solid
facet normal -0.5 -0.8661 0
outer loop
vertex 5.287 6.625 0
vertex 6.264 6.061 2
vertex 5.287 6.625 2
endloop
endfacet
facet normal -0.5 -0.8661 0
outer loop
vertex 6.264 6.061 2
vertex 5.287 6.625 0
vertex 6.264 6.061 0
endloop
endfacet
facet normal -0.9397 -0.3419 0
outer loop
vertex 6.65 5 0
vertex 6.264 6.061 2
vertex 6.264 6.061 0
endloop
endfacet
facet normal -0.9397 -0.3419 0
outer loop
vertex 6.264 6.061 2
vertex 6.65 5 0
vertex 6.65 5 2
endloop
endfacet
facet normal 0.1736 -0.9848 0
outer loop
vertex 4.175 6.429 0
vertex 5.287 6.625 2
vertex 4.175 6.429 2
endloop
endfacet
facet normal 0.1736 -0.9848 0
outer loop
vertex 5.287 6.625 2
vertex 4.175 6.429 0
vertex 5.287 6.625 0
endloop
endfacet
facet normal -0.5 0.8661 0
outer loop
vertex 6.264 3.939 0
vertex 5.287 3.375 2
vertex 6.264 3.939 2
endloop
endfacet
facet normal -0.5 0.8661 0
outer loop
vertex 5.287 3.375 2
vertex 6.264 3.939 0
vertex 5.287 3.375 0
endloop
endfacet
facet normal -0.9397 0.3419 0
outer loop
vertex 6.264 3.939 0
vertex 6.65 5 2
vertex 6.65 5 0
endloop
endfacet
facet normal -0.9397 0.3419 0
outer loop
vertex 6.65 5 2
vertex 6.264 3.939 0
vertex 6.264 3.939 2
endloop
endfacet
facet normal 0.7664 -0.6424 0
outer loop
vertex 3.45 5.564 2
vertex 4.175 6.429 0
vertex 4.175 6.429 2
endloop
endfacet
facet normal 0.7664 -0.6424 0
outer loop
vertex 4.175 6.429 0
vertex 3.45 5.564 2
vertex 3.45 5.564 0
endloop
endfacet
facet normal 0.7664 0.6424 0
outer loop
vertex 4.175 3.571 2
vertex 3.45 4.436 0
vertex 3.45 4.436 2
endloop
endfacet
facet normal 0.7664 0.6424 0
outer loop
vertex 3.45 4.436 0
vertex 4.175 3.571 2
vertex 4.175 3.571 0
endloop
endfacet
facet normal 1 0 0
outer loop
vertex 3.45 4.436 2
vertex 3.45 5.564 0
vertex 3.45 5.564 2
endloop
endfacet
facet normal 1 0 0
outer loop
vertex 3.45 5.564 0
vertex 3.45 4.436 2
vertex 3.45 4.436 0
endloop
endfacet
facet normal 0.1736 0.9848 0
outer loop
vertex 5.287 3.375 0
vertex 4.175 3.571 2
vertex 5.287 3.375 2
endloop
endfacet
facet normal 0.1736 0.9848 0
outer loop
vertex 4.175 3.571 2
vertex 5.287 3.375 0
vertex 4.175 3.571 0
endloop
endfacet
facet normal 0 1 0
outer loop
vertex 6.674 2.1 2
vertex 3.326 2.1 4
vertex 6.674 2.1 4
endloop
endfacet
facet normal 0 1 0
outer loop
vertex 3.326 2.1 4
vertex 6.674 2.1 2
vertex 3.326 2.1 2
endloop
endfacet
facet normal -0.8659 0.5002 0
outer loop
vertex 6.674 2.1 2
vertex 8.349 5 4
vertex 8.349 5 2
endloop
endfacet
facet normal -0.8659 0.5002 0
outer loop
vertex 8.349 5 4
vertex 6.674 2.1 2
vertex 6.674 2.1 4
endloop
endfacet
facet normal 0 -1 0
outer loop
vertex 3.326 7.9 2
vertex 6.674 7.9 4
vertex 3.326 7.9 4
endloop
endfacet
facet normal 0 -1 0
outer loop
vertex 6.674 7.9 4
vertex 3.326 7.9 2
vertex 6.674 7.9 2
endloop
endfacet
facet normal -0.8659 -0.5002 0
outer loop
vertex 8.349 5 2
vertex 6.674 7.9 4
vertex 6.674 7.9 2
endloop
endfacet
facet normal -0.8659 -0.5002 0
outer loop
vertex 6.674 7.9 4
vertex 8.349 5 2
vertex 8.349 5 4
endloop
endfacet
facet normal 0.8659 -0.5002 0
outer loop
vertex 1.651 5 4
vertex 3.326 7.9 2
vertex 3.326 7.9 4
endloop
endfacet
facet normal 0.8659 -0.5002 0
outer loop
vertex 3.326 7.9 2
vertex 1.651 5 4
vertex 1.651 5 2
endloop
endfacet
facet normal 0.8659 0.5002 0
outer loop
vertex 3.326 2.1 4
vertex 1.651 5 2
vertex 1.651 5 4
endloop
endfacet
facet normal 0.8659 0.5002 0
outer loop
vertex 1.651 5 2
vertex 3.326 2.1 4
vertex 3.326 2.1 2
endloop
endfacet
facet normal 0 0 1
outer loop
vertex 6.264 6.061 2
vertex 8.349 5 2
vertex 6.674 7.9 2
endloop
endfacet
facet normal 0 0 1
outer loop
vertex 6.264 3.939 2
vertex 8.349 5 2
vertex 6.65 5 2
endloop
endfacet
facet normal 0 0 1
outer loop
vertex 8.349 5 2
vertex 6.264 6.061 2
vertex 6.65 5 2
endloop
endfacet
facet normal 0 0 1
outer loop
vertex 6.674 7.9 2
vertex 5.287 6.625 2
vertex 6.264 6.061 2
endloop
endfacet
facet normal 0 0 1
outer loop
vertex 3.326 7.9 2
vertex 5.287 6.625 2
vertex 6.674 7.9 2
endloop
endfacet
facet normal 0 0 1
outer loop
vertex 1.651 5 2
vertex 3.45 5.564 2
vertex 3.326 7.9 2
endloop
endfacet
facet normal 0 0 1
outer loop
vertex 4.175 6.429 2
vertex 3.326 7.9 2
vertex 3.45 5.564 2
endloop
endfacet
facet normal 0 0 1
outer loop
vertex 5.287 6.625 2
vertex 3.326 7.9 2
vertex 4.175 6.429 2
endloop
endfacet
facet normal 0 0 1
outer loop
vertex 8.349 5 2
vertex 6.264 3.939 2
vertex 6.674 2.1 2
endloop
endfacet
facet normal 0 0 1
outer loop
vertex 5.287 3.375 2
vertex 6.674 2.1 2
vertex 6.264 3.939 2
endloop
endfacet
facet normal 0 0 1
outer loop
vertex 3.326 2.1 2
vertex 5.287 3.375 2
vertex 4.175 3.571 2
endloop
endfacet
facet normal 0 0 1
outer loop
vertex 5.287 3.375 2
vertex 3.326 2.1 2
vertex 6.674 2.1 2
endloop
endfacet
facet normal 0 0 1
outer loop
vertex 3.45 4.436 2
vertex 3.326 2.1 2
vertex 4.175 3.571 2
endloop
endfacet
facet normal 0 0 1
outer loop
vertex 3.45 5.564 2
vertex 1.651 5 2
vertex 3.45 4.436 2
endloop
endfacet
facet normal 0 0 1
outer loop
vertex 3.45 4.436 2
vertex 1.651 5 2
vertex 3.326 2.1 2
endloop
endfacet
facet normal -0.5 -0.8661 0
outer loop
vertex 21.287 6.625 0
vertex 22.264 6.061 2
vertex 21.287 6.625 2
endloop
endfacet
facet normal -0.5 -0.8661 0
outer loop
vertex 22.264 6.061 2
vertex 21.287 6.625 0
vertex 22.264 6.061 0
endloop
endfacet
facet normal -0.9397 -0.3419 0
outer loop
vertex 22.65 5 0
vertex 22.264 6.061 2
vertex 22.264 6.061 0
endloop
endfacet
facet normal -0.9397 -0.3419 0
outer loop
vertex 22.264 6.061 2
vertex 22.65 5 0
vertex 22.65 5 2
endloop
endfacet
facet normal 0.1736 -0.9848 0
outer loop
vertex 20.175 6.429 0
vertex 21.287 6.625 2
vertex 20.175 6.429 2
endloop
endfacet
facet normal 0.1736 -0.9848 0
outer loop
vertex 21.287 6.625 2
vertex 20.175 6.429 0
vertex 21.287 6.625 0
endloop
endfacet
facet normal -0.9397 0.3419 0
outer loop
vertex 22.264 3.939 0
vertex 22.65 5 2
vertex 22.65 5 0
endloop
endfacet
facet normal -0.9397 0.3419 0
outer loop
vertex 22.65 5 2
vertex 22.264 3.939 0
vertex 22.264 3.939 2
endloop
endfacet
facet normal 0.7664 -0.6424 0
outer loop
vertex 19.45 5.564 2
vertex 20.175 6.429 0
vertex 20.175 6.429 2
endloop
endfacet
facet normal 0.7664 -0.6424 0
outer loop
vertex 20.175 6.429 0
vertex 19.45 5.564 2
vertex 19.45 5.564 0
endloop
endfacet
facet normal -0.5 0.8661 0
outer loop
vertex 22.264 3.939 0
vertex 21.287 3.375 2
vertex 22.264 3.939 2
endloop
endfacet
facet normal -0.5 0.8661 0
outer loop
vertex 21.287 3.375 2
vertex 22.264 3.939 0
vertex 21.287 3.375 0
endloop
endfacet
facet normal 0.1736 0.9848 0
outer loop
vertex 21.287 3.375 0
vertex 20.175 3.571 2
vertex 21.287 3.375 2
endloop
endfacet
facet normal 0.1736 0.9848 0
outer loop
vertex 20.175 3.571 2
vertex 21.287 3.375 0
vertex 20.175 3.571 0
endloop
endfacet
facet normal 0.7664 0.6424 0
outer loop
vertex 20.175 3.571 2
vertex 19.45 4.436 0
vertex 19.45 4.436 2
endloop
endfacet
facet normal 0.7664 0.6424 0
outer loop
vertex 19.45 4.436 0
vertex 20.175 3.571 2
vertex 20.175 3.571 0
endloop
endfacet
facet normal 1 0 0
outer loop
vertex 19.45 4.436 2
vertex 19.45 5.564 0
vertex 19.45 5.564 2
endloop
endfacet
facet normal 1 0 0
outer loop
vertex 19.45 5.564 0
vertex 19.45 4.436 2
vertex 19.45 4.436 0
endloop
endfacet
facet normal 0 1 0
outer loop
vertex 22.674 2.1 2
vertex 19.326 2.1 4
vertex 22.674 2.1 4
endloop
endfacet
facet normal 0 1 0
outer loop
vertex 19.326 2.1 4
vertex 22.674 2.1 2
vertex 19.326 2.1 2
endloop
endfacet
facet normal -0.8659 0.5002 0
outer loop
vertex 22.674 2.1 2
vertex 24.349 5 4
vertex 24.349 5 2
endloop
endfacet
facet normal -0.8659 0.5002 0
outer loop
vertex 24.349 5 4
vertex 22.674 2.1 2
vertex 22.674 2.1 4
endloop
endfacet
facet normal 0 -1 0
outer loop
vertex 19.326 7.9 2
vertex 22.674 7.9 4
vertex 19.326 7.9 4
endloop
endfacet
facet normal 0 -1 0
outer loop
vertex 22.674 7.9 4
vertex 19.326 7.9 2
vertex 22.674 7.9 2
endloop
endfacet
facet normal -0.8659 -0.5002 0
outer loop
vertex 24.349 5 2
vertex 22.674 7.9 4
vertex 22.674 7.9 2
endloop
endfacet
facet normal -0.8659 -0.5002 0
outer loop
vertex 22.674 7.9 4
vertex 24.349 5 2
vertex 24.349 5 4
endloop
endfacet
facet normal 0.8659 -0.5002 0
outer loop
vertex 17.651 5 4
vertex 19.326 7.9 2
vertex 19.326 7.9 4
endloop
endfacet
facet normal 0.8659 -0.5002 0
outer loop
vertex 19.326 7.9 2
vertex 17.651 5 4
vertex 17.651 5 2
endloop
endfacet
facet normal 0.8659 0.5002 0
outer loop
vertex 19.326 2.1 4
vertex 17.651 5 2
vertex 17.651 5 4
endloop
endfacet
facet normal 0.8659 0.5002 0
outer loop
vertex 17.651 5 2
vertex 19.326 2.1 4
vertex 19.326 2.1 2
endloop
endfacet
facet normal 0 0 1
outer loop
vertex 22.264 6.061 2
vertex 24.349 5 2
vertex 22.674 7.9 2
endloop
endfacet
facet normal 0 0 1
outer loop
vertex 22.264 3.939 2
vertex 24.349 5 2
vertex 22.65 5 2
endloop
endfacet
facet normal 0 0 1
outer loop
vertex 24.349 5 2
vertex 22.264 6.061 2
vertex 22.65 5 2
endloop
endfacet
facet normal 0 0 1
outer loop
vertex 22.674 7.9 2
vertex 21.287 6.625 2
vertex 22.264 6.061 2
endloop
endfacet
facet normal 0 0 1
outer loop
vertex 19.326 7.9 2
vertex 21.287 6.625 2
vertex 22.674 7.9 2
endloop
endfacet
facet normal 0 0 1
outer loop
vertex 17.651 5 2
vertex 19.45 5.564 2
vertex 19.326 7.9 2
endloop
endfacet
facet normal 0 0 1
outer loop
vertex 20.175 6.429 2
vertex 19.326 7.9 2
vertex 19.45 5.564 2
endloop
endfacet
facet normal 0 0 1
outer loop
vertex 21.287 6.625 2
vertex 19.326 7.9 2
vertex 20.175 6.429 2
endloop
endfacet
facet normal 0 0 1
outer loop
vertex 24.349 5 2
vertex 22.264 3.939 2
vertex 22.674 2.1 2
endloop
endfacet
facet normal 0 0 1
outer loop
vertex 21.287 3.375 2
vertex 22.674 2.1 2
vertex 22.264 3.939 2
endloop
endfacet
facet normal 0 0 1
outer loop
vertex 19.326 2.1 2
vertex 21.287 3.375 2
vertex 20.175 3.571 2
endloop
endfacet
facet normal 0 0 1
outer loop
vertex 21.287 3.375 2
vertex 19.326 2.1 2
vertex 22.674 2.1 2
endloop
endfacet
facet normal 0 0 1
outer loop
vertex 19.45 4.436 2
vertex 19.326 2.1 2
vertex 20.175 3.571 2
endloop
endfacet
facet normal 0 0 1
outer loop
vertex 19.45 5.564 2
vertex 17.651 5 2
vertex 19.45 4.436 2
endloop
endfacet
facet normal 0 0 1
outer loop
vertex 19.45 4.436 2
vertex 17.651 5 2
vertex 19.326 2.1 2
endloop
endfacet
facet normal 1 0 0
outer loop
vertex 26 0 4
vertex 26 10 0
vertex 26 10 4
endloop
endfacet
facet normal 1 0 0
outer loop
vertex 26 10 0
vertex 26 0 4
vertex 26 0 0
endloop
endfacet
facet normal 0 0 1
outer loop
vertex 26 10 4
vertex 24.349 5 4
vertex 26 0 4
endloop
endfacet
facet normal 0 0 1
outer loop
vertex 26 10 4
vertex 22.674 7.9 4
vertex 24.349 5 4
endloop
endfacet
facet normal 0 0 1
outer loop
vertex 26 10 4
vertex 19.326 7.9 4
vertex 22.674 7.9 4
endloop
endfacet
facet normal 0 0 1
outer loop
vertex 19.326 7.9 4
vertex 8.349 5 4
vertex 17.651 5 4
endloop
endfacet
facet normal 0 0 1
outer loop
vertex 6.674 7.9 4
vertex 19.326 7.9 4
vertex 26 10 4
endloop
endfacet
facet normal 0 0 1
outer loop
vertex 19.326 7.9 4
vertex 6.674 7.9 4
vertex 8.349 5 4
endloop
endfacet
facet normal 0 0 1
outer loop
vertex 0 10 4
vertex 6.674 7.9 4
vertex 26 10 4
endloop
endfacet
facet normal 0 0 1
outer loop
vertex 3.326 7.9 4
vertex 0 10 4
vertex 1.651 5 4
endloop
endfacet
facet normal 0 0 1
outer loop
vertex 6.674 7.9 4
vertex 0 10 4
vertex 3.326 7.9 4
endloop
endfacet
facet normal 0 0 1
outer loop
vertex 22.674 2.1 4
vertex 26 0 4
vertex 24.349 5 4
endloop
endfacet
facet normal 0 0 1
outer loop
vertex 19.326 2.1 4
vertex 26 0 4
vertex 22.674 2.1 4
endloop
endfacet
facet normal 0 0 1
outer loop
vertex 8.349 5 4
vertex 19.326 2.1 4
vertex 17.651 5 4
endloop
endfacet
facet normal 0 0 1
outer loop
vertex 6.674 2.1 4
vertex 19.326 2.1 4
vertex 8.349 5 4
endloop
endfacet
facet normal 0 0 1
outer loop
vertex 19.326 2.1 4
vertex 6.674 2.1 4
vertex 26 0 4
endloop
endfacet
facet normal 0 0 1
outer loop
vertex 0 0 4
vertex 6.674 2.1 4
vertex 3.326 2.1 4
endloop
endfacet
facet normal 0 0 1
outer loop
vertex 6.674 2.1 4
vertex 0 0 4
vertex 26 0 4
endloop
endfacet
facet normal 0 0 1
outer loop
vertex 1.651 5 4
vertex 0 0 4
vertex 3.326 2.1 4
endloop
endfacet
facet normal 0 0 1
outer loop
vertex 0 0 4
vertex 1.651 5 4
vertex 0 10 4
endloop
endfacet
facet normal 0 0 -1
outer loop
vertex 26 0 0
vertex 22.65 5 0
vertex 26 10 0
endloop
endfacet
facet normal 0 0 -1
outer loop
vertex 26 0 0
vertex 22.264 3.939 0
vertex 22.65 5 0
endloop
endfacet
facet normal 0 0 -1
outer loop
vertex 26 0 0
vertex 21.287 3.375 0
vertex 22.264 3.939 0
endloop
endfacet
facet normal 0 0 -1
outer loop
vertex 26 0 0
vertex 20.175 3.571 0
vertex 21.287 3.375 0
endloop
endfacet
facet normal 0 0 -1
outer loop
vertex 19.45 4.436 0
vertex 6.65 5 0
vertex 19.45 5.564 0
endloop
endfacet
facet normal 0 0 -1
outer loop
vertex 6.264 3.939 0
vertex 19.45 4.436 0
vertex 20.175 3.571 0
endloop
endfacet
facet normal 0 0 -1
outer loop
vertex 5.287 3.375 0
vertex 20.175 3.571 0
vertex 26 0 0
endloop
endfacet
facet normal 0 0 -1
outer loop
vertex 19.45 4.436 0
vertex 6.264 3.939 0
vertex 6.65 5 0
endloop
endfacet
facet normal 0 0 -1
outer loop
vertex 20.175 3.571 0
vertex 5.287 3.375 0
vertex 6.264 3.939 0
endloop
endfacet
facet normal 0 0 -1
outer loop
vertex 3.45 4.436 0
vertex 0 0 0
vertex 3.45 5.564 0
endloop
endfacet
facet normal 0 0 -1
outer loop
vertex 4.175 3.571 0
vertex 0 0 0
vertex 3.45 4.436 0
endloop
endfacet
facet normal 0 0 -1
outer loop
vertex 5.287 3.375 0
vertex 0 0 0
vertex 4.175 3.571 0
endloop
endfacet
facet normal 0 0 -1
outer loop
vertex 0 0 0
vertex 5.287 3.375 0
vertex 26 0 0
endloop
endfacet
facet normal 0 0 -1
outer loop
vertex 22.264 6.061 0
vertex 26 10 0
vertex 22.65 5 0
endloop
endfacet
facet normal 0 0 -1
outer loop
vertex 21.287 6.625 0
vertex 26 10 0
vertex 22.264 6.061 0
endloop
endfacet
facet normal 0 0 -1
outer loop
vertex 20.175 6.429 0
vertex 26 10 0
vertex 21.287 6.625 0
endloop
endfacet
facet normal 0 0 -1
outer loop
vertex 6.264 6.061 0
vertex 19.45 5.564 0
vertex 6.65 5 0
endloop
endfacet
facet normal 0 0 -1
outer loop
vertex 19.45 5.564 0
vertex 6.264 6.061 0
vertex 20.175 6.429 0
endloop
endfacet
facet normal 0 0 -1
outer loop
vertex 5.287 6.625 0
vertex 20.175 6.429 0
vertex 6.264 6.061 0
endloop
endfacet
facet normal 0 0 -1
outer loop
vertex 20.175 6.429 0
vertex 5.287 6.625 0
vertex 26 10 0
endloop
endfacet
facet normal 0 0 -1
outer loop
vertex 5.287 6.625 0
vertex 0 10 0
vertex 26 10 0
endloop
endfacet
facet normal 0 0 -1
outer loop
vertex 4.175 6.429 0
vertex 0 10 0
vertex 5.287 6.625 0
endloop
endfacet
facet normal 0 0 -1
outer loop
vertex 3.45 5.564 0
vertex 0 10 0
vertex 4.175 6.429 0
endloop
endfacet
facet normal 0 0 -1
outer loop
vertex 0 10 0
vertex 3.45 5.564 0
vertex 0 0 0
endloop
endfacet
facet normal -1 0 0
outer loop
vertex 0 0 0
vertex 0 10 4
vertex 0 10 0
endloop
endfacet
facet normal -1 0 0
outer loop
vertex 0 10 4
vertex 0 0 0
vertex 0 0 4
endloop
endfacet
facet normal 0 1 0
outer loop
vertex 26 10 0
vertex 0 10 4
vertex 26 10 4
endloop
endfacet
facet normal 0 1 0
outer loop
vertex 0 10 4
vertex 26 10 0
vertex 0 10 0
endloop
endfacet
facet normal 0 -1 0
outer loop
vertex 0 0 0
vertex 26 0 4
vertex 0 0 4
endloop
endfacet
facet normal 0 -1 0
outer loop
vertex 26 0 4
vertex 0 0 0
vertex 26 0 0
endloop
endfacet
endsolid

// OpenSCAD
// file: parameters.scad
// Parameters file for RepRap Huxley

pi=3.14159265;

// The relative location in your file system where the .dxf files are
// DXFs are for quick development.  They should be replaced by parameterised CSG in dure course.

fileroot="DXF-files/";

rodsize = 6;	//threaded/smooth rod diameter in mm
xaxis = 182.5;	//width of base in mm
yaxis = 266.5;	//length of base in mm


screwsize = 3;	//bearing bore/screw diameter in mm
bearingsize = 10;	//outer diameter of bearings in mm
bearingwidth = 4;	//width of bearings in mm


rodpitch = rodsize / 6;
rodnutsize = 0.8 * rodsize; //4.8
rodwashersize = 0.2 * rodsize; //1.2
rodwasherdiameter = 2 * rodsize;//12
screwpitch = screwsize / 6;
nutsize = 0.8 * screwsize;
nutdiameter = 1.9 * screwsize;
washersize = 0.2 * screwsize;
washerdiameter = 2 * screwsize;
partthick = 2 * (rodsize+1); //12
vertexrodspace = 2 * rodsize; //12


c = [0.3, 0.3, 0.3];
rodendoffset = rodnutsize + rodwashersize * 2 + partthick / 2;//13.2
vertexoffset = vertexrodspace + rodendoffset;//25.2
//vertexoffset = 22;

renderrodthreads = false;
renderscrewthreads = false;
fn = 36;

// The gap between the joining rods at a vertex

vertex_radius=sqrt(rodsize*rodsize + vertexoffset*vertexoffset);
vertex_ang = atan(vertexoffset/rodsize)-30;
vertex_gap = 2*vertex_radius*cos(vertex_ang);

// Nema 14 dimensions - these are absolute

nema14_square=35.3;
nema14_screws=26;
nema14_screw_r=1.5;
nema14_hub=22;
nema14_hub_depth=2;
nema14_length=36;
nema14_shaft=5;
nema14_shaft_length=66;
nema14_shaft_projection=19;

// Nema 11 dimensions - these are absolute

nema11_square=28.5;
nema11_screws=23;
nema11_screw_r=1.25;
nema11_hub=22;
nema11_hub_depth=2;
nema11_length=44.5;
nema11_shaft=5;
nema11_shaft_length=78;
nema11_shaft_projection=18;

// Limit switch parameters

limit_switch_hole_diameter=2.5;
limit_switch_centres=9.5;

// The RepRap slide bearings

bearing_mount_centres=18;
bearing_width=7;

// X axis parameters - many should be relative

x_bar_gap=30;
motor_center_y = 26;
bar_clamp_x=5;
bar_clamp_y=8;
bar_clamp_x_gap=23;
bearing_y=50;
bearing_x=bar_clamp_x_gap + 10;
hole_land=4;
thickness=5;
bearing_low_z = 8;
bearing_z_gap = 25;
bearing_plate_width = bearing_mount_centres+2*hole_land + 10;
bearing_plate_overlap=0.5;
bearing_plate_support=10;
// file: configuration.scad
// eMAKEr Huxley
// Configuration file
// GNU GPL v3
// Jean-Marc Giacalone
// info@emakershop.com
// www.emakershop.com
// http://www.reprap.org/wiki/EMAKER_Huxley
// http://github.com/jmgiacalone/eMAKERHuxley

use <library.scad>

//Round corner diameter
round_corner_diameter = 8;

//Thin wall size
layer_height = 0.4;
perimeter_width_over_thicknes = 1.6;
infill_widht_over_thickness = 1.55;
thin_wall = 2*(perimeter_width_over_thicknes*layer_height+infill_widht_over_thickness*layer_height);
if(thin_wall<2){
	echo("Check thin wall size, its below 2mm!");
}
echo(thin_wall);

// MINI-HUXLEY VERSION (TODO, just place holder)
// include <configuration-huxley.scad>
m8_diameter=8.3;
m5_diameter=5.3;
m4_diameter=4.3;
m3_diameter=3.3;
m3_dia_clr=3.5;
m3_nut = 2.8;
m3_af = 5.8;
m6_diameter = 6;
m6_nut = 11.5;
bushing_diameter = 8;
motor_shaft=5.3;
bushing_rodsize = 6;
bushing_outerDiameter = 12;
bushing_lenght = 8;

// Some basic functions, probably should be somewhere else
// main file
// PRUSA Mendel  
// Belt clamp
// GNU GPL v2
// Josef Průša
// josefprusa@me.com
// prusadjs.cz
// http://www.reprap.org/wiki/Prusa_Mendel
// http://github.com/prusajr/PrusaMendel

include <configuration.scad>
module beltclamp(){
difference(){
cube([26,10,4]);
translate(v = [4, 5, 0]){
	//cylinder(h=10, r=m3_diameter/2, $fn=9, center=true);
	translate([1,0,0]) for(i=[0,1]){
		translate(v = [16*i, 0, 0]) cylinder(h=10, r=m3_diameter/2, $fn=9, center=true);
		translate(v = [16*i, 0, 2]) cylinder(h=5, r=m3_af/sqrt(3), $fn=6);
	}
}}
}
beltclamp();
